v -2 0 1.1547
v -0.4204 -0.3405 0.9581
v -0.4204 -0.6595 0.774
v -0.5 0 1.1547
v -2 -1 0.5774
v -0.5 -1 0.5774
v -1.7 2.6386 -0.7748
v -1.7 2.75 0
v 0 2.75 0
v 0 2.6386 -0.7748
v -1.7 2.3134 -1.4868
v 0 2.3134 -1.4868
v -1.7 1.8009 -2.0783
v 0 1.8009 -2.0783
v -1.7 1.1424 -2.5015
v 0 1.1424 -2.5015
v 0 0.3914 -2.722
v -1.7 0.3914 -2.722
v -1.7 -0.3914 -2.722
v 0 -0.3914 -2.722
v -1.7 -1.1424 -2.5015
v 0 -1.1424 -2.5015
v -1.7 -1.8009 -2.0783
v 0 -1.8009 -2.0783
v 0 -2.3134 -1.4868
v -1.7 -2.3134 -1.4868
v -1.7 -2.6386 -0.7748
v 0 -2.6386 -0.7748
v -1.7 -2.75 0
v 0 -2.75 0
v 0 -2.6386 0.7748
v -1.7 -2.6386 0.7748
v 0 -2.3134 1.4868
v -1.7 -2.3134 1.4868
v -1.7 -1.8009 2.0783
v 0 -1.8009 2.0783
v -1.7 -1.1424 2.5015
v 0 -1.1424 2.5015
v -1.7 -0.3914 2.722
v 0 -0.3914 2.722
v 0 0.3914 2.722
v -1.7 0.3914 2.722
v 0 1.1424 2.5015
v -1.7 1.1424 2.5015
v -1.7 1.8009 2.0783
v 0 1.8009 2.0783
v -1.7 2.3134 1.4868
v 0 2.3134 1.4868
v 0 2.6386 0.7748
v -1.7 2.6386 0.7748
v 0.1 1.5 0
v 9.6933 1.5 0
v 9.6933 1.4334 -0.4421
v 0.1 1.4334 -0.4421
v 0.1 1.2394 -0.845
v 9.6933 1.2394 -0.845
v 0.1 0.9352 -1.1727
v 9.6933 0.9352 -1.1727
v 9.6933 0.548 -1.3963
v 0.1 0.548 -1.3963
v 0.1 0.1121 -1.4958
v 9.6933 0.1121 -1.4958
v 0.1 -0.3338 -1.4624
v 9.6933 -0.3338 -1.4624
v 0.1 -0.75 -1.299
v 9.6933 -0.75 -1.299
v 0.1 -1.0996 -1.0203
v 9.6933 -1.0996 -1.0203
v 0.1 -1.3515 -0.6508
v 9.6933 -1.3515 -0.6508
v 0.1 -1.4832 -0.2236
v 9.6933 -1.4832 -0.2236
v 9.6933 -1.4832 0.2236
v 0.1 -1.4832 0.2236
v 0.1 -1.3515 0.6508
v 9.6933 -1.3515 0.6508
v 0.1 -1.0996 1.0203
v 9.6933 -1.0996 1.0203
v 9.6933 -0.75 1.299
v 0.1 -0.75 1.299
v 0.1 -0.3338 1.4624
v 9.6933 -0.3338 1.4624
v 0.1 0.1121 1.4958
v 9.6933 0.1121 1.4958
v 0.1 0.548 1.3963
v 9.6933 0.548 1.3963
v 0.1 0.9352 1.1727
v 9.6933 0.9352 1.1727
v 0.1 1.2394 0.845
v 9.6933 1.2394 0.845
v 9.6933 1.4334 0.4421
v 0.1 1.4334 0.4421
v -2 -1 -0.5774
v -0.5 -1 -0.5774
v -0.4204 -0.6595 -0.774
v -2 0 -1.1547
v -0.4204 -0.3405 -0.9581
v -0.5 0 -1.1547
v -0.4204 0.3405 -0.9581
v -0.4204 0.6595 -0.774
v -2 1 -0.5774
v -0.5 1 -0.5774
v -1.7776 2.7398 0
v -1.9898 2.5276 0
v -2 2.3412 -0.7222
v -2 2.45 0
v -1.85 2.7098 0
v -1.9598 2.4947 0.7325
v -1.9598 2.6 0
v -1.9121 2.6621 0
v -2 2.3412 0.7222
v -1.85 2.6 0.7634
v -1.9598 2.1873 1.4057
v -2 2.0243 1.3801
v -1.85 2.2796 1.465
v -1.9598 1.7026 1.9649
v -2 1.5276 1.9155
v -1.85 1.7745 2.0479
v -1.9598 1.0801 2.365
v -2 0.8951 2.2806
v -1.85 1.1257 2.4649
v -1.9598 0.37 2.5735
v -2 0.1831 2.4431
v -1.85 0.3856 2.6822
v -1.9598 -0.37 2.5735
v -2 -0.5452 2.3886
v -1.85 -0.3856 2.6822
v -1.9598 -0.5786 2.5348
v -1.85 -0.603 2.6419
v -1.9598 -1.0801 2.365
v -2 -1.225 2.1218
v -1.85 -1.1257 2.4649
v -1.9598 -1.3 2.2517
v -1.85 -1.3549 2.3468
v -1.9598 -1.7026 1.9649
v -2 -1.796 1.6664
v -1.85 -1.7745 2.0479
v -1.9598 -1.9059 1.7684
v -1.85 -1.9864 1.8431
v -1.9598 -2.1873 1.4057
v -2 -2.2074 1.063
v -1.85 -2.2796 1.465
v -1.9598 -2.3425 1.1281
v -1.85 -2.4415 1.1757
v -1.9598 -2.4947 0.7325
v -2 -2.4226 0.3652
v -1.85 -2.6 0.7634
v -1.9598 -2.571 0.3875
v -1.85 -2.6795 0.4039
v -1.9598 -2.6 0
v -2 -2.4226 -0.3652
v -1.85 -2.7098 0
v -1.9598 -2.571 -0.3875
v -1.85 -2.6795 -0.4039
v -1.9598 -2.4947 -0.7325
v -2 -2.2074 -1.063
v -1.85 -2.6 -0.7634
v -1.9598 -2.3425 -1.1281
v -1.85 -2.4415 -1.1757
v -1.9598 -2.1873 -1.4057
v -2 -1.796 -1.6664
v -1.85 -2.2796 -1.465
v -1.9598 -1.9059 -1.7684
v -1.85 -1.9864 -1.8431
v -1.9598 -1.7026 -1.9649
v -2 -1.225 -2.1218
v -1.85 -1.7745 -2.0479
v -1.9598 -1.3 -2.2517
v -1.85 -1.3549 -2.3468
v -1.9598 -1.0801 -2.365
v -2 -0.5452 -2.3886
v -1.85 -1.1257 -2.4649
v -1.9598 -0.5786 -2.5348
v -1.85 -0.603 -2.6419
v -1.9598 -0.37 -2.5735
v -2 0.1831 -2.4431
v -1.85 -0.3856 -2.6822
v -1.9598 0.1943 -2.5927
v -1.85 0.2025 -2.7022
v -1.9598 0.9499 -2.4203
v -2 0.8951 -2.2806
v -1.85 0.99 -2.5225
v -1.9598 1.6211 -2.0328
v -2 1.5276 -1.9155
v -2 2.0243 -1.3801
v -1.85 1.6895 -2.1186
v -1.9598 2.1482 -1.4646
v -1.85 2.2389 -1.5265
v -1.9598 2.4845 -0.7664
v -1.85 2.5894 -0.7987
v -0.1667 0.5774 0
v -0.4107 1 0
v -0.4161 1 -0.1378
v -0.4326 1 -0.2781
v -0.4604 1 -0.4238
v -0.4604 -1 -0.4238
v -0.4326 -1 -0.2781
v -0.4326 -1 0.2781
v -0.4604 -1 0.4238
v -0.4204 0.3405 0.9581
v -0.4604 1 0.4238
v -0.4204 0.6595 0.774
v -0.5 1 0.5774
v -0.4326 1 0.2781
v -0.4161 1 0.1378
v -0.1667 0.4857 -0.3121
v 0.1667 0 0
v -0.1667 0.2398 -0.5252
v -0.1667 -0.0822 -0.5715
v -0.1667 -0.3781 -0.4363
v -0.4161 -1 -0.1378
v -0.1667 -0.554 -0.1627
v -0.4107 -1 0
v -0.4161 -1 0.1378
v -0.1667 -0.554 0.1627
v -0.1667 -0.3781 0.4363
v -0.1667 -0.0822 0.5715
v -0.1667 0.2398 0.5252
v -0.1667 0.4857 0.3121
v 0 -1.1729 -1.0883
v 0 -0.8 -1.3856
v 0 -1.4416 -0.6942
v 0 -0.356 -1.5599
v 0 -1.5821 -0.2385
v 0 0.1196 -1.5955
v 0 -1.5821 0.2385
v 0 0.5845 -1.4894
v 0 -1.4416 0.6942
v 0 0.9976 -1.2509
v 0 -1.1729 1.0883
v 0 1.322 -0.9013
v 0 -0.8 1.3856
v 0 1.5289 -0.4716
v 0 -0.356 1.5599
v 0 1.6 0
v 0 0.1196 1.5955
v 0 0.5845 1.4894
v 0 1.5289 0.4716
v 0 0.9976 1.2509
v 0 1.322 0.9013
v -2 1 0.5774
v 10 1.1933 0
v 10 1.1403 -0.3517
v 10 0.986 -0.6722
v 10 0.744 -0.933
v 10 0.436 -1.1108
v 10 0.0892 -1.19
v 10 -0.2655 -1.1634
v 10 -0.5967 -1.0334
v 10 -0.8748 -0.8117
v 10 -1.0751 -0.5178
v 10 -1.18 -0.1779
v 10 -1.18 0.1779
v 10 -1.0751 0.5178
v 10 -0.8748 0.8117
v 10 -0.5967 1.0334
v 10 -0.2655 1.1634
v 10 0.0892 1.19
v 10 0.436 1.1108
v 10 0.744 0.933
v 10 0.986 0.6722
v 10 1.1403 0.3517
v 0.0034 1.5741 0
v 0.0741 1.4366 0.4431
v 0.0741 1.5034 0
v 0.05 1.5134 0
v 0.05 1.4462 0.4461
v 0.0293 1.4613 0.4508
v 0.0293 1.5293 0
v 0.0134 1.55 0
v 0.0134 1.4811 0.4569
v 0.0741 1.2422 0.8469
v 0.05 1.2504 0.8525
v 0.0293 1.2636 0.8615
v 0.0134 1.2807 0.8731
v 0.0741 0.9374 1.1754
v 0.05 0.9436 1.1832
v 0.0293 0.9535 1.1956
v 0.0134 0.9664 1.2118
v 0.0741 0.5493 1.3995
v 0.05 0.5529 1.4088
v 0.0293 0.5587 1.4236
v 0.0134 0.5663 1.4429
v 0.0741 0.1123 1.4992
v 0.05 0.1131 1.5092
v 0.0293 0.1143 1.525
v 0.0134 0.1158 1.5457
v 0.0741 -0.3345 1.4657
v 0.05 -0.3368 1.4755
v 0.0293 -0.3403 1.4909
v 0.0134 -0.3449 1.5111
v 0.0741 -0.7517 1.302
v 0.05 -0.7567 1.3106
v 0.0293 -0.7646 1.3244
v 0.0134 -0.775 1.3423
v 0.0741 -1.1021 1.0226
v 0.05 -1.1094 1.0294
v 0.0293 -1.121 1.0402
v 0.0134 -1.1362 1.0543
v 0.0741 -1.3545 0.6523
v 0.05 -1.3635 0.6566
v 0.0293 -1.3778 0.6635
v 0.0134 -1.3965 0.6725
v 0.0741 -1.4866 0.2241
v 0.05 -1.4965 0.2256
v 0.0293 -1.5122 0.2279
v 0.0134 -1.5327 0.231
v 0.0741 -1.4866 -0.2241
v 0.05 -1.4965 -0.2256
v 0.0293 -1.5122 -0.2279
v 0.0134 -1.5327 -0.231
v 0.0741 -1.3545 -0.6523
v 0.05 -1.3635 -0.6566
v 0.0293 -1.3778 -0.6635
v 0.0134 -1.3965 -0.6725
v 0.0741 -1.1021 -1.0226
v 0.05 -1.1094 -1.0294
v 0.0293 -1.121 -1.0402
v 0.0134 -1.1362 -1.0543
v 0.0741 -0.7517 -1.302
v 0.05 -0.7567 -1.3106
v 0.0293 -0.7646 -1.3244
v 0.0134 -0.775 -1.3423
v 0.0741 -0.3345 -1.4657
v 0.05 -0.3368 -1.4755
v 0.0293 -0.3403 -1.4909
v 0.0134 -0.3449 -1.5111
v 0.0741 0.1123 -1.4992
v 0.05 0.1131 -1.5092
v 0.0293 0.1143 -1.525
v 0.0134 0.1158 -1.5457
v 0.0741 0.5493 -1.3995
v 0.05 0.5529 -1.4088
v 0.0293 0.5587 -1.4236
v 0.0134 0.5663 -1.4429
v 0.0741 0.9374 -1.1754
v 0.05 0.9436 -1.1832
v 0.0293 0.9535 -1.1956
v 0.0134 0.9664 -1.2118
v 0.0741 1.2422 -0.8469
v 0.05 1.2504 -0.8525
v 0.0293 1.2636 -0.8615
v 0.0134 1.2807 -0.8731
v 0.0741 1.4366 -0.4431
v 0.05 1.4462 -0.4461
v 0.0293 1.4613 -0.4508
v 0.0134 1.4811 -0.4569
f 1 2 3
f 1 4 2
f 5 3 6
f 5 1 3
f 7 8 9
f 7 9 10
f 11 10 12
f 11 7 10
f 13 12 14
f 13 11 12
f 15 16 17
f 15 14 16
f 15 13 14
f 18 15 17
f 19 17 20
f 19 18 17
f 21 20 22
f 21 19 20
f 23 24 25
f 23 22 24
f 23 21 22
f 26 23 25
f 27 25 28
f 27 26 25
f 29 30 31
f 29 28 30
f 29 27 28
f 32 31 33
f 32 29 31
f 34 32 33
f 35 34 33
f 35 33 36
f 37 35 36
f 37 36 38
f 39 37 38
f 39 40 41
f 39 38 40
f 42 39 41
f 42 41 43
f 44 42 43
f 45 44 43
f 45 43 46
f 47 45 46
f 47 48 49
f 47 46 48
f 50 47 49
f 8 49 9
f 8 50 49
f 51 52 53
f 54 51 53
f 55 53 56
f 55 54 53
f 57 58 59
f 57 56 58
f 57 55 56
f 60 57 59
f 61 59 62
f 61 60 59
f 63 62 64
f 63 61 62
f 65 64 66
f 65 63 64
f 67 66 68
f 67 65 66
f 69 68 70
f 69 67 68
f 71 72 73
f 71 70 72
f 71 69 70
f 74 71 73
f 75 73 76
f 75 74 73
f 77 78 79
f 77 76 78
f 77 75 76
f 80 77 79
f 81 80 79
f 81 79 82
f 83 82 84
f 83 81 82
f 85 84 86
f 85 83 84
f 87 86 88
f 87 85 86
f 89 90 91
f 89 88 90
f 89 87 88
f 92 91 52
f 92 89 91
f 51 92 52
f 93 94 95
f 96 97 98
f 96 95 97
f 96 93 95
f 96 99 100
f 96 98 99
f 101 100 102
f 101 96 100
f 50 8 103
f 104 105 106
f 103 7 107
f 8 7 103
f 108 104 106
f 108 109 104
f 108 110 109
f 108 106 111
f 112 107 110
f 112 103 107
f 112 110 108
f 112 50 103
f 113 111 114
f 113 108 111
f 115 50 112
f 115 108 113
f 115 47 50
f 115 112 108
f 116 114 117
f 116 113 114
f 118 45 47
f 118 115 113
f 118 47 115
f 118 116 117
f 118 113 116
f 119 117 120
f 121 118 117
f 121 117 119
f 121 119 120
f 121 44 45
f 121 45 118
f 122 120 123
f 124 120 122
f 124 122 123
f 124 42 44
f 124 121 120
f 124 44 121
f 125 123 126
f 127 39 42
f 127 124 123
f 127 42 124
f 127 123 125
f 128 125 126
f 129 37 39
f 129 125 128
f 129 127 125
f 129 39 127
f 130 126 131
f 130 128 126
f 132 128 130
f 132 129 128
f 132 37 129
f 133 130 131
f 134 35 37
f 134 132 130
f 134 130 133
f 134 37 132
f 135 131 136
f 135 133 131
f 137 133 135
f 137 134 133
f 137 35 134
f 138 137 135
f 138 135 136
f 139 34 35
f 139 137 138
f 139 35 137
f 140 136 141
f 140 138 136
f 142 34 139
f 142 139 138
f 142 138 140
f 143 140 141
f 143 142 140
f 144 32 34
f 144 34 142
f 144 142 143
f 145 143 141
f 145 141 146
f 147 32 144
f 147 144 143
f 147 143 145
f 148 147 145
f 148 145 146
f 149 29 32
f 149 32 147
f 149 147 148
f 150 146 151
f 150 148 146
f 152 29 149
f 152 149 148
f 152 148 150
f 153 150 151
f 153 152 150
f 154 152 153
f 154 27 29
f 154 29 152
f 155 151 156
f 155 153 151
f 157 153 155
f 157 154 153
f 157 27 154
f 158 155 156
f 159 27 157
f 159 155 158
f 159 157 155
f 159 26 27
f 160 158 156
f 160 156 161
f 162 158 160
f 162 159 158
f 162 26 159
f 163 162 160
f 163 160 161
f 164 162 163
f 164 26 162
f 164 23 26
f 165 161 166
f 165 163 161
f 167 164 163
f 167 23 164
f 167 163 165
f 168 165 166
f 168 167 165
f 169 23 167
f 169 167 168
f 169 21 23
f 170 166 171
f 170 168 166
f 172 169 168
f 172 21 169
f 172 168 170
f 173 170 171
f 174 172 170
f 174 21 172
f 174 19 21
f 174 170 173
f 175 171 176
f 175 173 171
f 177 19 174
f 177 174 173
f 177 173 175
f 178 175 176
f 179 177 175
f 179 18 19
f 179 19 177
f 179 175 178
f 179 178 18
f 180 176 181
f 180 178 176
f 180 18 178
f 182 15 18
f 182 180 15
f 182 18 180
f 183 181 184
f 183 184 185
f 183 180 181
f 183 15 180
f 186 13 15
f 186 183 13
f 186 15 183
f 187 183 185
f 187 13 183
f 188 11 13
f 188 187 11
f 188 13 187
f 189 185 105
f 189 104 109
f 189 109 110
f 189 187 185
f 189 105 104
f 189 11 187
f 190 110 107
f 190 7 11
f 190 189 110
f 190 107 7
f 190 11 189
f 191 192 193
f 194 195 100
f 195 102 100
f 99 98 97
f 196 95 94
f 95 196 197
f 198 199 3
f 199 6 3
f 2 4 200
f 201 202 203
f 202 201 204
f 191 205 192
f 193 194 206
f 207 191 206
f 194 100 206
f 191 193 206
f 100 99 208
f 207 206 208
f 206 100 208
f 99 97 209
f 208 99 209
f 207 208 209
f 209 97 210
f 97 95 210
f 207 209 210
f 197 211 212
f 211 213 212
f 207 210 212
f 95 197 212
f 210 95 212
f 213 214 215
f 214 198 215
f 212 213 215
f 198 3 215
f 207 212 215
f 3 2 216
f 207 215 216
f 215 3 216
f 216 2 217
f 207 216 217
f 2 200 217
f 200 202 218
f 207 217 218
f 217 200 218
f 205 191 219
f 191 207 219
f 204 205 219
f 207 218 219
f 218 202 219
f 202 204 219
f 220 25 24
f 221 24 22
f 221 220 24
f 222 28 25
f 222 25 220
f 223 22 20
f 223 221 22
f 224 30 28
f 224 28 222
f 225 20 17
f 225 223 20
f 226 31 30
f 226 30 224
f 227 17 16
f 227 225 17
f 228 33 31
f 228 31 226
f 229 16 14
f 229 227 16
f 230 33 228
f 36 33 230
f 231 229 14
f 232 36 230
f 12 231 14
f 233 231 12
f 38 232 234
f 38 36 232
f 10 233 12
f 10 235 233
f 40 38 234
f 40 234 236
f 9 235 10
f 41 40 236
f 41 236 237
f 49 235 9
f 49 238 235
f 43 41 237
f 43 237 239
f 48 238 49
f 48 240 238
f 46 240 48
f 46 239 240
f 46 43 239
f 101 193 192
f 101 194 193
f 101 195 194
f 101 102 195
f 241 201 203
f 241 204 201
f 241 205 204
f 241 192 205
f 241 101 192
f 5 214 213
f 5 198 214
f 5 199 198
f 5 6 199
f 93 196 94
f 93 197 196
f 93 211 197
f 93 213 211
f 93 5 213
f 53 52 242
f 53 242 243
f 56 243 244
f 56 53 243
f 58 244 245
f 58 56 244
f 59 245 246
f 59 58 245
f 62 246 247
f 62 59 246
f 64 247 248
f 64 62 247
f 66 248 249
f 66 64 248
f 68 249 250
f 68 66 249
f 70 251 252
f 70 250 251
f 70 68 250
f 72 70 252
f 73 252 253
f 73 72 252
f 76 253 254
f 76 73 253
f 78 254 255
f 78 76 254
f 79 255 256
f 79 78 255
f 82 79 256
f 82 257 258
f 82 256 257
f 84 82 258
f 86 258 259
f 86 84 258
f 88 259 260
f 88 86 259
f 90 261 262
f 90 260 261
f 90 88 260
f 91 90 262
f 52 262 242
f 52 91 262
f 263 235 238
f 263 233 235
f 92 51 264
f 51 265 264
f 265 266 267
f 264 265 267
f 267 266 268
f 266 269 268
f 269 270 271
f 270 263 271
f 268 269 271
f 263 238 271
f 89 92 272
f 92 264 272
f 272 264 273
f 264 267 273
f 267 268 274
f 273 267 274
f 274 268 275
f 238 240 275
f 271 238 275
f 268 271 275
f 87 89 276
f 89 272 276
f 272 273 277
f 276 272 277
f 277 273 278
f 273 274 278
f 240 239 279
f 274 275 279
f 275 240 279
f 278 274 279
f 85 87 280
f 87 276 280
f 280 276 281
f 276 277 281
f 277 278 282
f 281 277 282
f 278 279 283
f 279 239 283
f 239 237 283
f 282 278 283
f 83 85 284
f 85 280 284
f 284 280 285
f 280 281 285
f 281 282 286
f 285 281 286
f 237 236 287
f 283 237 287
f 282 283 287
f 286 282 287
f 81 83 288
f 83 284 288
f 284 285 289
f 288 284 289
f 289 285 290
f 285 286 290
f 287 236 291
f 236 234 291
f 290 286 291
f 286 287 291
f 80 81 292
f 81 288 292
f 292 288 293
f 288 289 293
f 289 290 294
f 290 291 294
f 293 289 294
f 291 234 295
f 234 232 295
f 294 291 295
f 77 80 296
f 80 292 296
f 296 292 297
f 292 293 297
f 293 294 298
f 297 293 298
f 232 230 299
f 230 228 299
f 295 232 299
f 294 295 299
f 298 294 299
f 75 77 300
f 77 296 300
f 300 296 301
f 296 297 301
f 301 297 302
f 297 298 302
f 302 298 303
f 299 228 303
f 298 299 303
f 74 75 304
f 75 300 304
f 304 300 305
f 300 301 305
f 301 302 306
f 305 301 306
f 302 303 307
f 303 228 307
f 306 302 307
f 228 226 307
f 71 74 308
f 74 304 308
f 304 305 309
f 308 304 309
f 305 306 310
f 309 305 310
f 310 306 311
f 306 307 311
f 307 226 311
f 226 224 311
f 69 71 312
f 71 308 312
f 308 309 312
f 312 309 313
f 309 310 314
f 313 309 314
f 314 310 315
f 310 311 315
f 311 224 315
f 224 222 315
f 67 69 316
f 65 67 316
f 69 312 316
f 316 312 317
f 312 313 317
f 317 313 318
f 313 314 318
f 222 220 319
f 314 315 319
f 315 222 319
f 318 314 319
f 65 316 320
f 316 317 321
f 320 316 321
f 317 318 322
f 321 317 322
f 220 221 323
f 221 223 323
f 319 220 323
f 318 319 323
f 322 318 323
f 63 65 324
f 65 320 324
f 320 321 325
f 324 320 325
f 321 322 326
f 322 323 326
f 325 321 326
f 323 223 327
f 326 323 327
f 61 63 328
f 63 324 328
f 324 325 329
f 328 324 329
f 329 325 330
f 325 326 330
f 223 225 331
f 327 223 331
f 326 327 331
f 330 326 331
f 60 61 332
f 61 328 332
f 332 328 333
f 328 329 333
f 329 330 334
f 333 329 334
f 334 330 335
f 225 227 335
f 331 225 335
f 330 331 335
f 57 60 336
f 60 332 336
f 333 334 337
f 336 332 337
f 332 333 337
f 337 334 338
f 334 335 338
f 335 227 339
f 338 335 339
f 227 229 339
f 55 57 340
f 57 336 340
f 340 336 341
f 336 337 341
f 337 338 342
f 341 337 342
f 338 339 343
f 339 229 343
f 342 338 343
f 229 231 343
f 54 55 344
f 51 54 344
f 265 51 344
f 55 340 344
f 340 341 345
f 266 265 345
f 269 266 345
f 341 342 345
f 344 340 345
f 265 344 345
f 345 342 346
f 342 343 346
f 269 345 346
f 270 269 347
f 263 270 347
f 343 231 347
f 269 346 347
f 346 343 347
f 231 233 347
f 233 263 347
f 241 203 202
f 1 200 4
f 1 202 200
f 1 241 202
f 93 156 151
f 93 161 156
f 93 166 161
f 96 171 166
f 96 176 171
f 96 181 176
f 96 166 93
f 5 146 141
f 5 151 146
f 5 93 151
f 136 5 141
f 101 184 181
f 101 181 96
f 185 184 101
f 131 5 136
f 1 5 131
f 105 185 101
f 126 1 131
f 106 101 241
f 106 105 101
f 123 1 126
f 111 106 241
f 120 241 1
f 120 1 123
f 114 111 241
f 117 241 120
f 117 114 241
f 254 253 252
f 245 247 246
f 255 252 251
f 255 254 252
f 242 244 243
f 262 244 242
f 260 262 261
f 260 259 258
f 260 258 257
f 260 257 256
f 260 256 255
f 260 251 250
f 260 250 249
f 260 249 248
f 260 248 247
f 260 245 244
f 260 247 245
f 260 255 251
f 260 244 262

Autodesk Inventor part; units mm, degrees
ref_plane "YZ Plane" through (0, 0, 0) normal (1, 0, 0) x (0, 1, 0)
ref_plane "XZ Plane" through (0, 0, 0) normal (0, 1, 0) x (-1, 0, 0)
sketch "Skizze1" plane through (0, 0, 0) normal (0, 0, 1) x (1, 0, 0)
  line L0 (0.1667, 0) -> (10, 0)
  line L1 (10, 0) -> (10, 1.5)
  line L2 (10, 1.5) -> (1.5, 1.5)
  line L3 (1.5, 1.5) -> (1.1932, 1.5)
  line L4 (1.1932, 1.5) -> (0, 1.5)
  line L5 (0, 1.5) -> (0, 2.75)
  line L6 (0, 2.75) -> (-2, 2.75)
  line L7 (-2, 2.75) -> (-2, 1.1547)
  line L8 (-2, 1.1547) -> (-0.5, 1.1547)
  line L9 (-0.5, 1.1547) -> (0.1667, 0)
  line L10 (-4.4, 0) -> (12.4, 0) projected
  line L11 (0, -0.55) -> (0, 3.3) projected
  line L12 (1.5, 1.5) -> (0, 1.5) construction
  dimension "d1" = 8.5
  dimension "d2" = 0.3068
  dimension "d3" = 2
  dimension "d4" = 1.5
  dimension "d5" = 60
  dimension "d6" = 3
  dimension "d7" = 3
  dimension "d8" = 2.3094
  dimension "d9" = 5.5
  dimension "d26" = 10
revolve "Körper" add sketch "Skizze1" angle 360 about axis through (0.1667, 0, 0) along (1, 0, 0) contours L9 L11 L4 L3 L2 L1 L0 | L9 L8 L7 L6 L5 L11
sketch "Skizze2" plane through (-2, 0, 0) normal (-1, 0, 0) x (0, 0, 1)
  circle A0 centre (0, 0) radius 1.1547 projected
  line L0 (0, -3.85) -> (0, 3.85) projected
  line L1 (-3.85, 0) -> (3.85, 0) projected
  line L2 (1.1547, 0) -> (0.5774, -1)
  line L3 (0.5774, -1) -> (-0.5774, -1)
  line L4 (-0.5774, -1) -> (-1.1547, 0)
  line L5 (-1.1547, 0) -> (-0.5774, 1)
  line L6 (-0.5774, 1) -> (0.5774, 1)
  line L7 (0.5774, 1) -> (1.1547, 0)
  point P0 (0, 0)
extrude "Loch" add sketch "Skizze2" against normal up to next contours L7 A0 | A0 L2 | L6 L0 A0 | A0 L0 L3 | L0 L6 A0 | A0 L3 L0 | L4 A0 | A0 L5
fillet "Rundung1" radius 0.3 1 edges at (-2, -2.75, 0)
thread "Gewinde" size "M3x0.5" class "6g" standard "ISO Metric profile" length 8.5
chamfer "Fase1" distance 0.3067 distance2 0.3067 1 edges at (10, -1.5, 0) measured on face at (10, -0.6587, -0.1791)
ref_plane "Work Plane1" through (29, 0, 0) normal (0, -1, 0) x (1, 0, 0)
fillet "Fillet2" radius 0.1 1 edges at (0, -1.5, 0)
equation "\"d1\" = GEL"
equation "\"d3\" = KOH"
equation "\"d4\" = INTI"
equation "\"d6\" = GD"
equation "\"d7\" = BDM"
equation "\"d8\" = 1.1547 * SW"
equation "\"d9\" = KOD"
equation "\"d26\" = NLG"
equation "\"d30\" = R"
equation "\"d17\" = RR"
equation "\"d13\" = GEL"
equation "\"d15\" = -0.5 * SPD + 0.5 * GD"
equation "\"d16\" = GUL"
equation "\"GD\" = NND"
equation "\"NLG\" = 10"
equation "\"GEL\" = 8.5"
equation "\"KOD\" = 5.5"
equation "\"KOH\" = 2"
equation "\"INTI\" = 1.5"
equation "\"GAL\" = 0.61345 * PTC"
equation "\"GUL\" = 0.61345 * PTC"
equation "\"BDM\" = NND"
equation "\"SW\" = 2"
equation "\"RR\" = 0.3"
equation "\"SPD\" = NND - 1.2269 * PTC"
equation "\"R\" = 0.1"
equation "\"TOA\" = 30deg"
equation "\"GD1\" = THREADDIA - 1.2269 * PTC"
equation "\"THREADDIA\" = 3"
equation "\"FAWI\" = 45deg"
equation "\"ANG\" = 120deg"
equation "\"PTC\" = 0.5"
equation "\"NND\" = 3"
equation "\"E0\" = 1.155 * SW"
properties part number "DIN 7984 - M3 x 10" material "Stahl, weich"
